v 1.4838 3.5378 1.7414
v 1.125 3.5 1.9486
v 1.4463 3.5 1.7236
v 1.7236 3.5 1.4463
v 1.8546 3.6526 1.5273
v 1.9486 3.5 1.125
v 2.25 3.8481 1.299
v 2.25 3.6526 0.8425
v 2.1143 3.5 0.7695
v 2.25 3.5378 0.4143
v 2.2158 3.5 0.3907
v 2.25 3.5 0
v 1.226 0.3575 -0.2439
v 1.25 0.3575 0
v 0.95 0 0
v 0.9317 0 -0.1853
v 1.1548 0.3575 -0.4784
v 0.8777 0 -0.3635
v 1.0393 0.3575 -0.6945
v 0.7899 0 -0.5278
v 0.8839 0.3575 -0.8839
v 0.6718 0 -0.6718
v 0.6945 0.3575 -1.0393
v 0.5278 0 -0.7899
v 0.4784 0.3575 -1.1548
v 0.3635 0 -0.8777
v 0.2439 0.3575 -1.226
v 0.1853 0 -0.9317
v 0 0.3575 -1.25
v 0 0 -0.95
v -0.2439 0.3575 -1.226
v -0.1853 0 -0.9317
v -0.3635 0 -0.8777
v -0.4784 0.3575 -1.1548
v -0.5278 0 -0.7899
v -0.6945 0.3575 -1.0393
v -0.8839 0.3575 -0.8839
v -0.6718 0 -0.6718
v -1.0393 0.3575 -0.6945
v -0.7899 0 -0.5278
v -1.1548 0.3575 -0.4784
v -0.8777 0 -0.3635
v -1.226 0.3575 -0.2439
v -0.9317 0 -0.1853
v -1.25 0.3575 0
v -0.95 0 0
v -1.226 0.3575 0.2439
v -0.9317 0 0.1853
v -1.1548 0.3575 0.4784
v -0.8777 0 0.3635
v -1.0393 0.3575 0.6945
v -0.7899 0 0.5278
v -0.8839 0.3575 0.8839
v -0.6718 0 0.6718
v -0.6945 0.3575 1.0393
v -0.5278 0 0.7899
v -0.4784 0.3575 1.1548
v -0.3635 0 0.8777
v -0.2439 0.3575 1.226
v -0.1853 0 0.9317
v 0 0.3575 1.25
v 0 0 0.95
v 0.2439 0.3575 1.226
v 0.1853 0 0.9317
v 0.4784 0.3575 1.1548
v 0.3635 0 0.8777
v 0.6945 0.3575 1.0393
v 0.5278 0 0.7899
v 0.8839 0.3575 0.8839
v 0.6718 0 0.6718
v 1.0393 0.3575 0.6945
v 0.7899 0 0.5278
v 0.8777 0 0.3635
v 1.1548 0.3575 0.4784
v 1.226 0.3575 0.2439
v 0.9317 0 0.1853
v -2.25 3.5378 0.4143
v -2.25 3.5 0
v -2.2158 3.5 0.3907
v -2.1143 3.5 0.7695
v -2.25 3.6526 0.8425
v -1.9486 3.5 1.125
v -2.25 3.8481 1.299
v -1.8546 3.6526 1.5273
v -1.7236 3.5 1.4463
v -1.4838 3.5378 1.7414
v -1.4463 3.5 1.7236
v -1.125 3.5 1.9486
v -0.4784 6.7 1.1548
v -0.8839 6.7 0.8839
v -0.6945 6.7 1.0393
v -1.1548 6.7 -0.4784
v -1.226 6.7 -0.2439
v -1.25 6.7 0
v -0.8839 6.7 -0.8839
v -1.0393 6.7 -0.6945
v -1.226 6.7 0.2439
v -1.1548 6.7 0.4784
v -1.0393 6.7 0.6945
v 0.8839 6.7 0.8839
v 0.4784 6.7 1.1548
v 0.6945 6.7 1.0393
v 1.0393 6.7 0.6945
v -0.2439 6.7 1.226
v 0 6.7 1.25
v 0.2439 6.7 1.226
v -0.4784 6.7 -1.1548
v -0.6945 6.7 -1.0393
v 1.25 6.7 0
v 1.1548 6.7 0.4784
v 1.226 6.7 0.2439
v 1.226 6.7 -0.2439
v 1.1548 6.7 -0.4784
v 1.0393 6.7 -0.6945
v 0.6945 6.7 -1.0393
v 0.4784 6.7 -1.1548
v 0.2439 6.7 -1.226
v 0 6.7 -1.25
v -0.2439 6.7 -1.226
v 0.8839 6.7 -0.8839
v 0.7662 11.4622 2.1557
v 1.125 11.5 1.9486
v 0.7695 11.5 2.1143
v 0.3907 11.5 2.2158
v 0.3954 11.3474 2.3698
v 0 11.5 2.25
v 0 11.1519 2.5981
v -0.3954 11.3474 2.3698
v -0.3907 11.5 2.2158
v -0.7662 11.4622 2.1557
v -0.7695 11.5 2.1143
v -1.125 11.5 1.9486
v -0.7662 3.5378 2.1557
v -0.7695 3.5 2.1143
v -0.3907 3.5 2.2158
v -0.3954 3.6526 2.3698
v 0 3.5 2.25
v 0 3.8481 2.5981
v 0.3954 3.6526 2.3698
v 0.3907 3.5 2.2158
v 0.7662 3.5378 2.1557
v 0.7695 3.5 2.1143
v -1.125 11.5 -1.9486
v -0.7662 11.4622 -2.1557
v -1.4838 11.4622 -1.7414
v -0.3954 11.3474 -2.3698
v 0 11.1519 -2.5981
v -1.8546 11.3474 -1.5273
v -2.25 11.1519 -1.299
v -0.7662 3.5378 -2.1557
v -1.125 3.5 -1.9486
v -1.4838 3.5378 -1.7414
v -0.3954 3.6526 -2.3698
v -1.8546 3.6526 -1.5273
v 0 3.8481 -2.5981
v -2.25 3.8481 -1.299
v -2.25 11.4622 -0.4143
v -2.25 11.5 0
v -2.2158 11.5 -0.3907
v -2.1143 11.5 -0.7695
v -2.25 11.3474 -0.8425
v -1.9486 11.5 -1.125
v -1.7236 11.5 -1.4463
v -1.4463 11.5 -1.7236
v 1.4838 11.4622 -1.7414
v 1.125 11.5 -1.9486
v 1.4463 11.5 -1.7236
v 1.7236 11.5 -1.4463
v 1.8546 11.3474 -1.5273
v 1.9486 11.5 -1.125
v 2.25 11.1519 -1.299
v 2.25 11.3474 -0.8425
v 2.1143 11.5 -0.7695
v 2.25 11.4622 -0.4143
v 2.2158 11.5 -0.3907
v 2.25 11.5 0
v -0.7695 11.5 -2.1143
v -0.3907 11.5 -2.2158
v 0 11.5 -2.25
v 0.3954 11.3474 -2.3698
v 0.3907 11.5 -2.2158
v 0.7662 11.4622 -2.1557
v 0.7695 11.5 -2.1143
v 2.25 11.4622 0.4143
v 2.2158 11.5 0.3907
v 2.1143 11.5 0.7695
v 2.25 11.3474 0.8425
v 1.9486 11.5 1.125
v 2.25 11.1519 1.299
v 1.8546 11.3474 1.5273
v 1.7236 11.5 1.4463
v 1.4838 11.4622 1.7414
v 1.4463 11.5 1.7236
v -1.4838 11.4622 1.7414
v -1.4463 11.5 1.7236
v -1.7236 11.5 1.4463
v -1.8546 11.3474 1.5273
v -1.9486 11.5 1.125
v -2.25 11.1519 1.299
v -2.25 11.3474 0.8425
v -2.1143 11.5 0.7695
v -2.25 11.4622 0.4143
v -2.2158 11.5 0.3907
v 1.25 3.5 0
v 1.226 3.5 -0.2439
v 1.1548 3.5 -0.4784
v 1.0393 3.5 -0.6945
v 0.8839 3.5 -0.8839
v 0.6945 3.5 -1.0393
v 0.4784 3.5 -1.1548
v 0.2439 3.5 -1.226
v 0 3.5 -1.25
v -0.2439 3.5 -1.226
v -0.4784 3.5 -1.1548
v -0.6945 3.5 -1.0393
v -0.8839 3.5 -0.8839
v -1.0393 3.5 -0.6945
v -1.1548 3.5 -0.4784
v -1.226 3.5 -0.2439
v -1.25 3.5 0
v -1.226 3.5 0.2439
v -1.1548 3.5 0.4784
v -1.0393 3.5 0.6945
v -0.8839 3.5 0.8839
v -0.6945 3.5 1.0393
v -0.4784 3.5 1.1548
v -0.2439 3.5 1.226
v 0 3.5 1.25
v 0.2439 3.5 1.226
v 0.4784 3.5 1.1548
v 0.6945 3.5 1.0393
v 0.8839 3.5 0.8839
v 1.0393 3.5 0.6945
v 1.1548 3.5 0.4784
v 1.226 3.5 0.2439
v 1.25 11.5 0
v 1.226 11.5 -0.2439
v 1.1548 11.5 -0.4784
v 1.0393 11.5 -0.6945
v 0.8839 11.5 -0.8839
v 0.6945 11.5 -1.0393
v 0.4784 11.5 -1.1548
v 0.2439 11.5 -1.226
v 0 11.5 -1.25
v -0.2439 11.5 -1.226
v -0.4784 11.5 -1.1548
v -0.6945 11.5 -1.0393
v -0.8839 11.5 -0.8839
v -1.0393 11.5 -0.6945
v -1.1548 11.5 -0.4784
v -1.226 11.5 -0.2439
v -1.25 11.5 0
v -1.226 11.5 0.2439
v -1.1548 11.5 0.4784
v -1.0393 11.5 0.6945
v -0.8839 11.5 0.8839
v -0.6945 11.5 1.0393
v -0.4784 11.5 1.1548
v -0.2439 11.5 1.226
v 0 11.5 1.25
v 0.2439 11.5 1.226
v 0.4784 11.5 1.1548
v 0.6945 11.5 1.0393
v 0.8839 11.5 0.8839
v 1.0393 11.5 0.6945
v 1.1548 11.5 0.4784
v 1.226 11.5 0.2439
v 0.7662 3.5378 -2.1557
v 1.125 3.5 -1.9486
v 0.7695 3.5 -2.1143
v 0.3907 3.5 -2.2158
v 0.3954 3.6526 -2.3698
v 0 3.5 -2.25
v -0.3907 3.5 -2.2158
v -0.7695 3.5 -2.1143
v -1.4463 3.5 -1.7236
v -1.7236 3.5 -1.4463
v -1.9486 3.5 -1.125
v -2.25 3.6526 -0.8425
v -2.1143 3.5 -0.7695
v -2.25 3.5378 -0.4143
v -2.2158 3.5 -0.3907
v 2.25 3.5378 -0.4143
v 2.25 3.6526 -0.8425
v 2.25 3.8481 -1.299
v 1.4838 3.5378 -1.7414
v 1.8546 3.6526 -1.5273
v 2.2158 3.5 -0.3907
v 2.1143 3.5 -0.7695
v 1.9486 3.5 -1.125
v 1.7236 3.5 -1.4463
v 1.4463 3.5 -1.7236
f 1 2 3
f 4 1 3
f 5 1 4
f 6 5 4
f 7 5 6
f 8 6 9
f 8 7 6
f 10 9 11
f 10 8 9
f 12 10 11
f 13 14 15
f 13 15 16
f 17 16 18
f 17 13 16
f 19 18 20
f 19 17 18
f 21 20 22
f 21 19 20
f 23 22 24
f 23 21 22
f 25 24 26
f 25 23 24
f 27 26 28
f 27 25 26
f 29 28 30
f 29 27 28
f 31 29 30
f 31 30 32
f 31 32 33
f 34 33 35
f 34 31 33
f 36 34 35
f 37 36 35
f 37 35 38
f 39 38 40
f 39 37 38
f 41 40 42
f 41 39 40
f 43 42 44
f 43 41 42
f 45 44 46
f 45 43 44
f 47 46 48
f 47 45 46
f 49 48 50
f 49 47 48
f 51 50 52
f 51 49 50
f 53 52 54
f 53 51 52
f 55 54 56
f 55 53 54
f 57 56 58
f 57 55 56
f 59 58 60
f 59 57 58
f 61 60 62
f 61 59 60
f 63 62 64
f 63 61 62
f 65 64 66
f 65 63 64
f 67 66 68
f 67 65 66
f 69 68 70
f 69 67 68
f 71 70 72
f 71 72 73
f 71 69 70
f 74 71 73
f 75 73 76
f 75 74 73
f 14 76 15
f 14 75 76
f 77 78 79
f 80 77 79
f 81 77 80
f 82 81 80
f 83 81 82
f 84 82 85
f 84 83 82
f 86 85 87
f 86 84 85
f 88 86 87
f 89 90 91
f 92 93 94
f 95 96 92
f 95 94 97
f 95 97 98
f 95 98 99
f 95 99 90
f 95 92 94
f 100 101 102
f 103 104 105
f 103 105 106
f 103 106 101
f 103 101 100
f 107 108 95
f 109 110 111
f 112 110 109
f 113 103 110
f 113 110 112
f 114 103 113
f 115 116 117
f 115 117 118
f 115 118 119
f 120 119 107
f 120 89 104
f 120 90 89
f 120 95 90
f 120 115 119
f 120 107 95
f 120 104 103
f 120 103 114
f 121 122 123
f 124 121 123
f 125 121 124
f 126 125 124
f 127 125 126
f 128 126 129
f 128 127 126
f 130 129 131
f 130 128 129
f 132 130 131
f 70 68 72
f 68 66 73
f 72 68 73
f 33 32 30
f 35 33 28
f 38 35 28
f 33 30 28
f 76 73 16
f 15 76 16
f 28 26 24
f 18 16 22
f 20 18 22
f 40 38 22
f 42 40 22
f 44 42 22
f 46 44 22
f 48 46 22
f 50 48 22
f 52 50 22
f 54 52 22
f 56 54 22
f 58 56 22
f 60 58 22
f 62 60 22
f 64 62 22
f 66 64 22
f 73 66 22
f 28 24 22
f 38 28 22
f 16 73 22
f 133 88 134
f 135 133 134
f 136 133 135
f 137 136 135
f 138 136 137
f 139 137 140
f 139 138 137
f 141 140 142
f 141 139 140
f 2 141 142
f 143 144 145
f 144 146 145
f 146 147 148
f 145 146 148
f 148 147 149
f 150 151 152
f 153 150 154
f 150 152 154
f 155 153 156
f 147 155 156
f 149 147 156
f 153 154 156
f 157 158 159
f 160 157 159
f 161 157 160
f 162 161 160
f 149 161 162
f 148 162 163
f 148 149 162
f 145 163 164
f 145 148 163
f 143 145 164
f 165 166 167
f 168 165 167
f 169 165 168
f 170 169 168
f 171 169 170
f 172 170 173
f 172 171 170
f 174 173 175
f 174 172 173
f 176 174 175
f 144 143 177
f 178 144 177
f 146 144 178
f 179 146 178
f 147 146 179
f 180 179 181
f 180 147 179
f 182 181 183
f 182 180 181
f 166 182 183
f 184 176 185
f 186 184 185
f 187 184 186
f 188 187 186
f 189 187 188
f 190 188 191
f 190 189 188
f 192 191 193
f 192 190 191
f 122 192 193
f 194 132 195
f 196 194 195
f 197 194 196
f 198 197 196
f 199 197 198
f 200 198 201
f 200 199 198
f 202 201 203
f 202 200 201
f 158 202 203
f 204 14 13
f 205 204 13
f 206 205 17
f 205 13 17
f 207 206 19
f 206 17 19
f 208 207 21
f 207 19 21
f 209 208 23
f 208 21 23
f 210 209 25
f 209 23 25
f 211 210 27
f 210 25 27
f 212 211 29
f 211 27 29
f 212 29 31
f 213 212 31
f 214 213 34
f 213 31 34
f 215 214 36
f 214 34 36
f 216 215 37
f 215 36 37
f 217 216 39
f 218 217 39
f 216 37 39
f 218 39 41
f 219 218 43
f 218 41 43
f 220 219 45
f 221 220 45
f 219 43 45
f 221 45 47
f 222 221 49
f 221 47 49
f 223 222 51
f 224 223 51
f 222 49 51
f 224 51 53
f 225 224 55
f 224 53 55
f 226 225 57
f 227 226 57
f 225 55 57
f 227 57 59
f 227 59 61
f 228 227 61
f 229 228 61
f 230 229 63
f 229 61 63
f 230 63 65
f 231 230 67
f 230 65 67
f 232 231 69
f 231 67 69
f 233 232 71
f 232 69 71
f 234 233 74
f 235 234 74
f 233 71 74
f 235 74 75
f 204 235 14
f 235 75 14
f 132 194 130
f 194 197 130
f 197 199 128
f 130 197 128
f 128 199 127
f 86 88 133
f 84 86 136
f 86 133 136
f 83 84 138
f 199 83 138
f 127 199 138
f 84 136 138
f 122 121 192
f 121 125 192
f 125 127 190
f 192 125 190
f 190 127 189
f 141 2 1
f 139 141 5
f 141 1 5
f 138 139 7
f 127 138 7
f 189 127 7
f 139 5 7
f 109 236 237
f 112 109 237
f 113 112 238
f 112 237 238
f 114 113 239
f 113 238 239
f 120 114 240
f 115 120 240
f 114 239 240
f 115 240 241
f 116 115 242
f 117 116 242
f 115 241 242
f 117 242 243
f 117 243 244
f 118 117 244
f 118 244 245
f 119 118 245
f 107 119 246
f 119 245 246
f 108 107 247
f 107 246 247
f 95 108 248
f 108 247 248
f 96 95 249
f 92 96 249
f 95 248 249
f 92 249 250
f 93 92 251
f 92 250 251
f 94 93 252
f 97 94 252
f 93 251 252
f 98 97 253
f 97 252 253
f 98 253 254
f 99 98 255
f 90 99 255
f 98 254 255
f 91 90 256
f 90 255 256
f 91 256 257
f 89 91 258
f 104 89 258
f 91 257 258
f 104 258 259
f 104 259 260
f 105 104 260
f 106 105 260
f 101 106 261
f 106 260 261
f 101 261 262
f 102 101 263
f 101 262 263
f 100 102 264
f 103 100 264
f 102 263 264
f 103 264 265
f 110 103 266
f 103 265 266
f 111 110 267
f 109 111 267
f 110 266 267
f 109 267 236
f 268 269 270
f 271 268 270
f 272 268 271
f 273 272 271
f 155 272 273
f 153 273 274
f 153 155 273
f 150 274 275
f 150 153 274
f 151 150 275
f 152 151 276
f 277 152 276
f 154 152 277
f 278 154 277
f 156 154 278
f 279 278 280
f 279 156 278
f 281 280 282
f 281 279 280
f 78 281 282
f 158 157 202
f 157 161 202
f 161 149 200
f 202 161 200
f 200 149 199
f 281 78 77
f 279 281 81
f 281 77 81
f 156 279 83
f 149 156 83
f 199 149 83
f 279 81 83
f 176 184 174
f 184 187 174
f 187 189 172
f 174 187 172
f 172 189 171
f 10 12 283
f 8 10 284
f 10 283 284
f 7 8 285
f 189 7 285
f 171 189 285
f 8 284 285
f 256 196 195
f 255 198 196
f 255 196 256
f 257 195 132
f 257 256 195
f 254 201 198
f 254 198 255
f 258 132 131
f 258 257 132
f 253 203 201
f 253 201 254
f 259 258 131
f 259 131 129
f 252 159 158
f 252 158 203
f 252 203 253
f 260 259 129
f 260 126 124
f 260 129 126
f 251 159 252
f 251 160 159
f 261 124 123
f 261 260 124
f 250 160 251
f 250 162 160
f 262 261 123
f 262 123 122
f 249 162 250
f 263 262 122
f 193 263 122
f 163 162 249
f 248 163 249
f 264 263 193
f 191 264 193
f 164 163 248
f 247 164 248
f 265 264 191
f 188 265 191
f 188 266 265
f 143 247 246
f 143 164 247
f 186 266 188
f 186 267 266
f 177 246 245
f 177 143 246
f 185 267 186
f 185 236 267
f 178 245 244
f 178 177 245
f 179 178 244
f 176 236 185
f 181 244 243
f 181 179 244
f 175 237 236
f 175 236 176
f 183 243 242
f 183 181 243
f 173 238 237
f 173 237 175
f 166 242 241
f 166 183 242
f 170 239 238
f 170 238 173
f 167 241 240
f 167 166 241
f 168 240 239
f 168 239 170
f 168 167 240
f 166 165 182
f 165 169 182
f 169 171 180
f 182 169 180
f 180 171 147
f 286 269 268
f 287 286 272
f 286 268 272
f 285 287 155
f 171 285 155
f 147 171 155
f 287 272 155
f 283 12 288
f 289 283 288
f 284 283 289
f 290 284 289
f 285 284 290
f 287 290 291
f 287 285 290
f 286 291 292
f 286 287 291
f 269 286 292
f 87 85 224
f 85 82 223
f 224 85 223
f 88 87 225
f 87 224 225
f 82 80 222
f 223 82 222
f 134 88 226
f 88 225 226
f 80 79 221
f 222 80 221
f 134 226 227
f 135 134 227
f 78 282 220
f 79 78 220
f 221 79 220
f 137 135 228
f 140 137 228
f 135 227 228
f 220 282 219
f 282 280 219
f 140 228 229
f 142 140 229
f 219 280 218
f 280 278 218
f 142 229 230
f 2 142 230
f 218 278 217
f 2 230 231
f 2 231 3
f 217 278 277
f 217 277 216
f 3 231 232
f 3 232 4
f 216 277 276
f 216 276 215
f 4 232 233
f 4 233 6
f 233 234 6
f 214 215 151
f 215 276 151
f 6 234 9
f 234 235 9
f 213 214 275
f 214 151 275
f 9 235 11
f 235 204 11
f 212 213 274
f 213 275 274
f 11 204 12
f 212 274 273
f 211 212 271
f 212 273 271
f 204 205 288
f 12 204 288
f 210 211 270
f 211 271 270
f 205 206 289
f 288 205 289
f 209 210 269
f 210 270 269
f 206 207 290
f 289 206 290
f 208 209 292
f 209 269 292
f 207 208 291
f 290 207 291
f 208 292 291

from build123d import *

# Parameters (mm, degrees)
SKETCH1_R           = 1.25
BOSS_EXTRUDE1_DEPTH = 3.5
BOSS_EXTRUDE2_DEPTH = 8
SKETCH3_R           = 1.25
CUT_EXTRUDE1_DEPTH  = 4.8
SKETCH5_OUTSIDE_W   = 34.18
SKETCH5_OUTSIDE_H   = 34.876
SKETCH5_OUTSIDE_R   = 2.25
CUT_EXTRUDE2_DEPTH  = 12.5
CUT_EXTRUDE2_TAPER  = 45
SKETCH6_OUTSIDE_W   = 27.18
SKETCH6_OUTSIDE_H   = 27.876
SKETCH6_OUTSIDE_R   = 2.25
CUT_EXTRUDE3_DEPTH  = 9
CUT_EXTRUDE3_TAPER  = 45
CHAMFER1_SIZE       = 0.3
CHAMFER1_SIZE2      = 0.357526078


with BuildPart() as part:
    # Sketch1 → Boss-Extrude1 (new body)
    with BuildSketch(Plane(origin=(0, 0, 0), x_dir=(1, 0, 0), z_dir=(0, 1, 0))):
        Circle(SKETCH1_R)
    extrude(amount=BOSS_EXTRUDE1_DEPTH)

    # Sketch2 → Boss-Extrude2 (add)
    with BuildSketch(Plane(origin=(0, 3.5, 0), x_dir=(1, 0, 0), z_dir=(0, 1, 0))):
        Polygon((2.25, -1.299038106), (2.25, 1.299038106), (0, 2.598076211), (-2.25, 1.299038106), (-2.25, -1.299038106), (0, -2.598076211), align=None)
    extrude(amount=BOSS_EXTRUDE2_DEPTH)

    # Sketch3 → Cut-Extrude1 (cut)
    with BuildSketch(Plane(origin=(0, 11.5, 0), x_dir=(1, 0, 0), z_dir=(0, 1, 0))):
        Circle(SKETCH3_R)
    extrude(amount=-CUT_EXTRUDE1_DEPTH, mode=Mode.SUBTRACT)

    # Sketch5 outside → Cut-Extrude2 (cut, through all)
    with BuildSketch(Plane(origin=(0, 11.5, 0), x_dir=(1, 0, 0), z_dir=(0, 1, 0))):
        Rectangle(SKETCH5_OUTSIDE_W, SKETCH5_OUTSIDE_H)
        Circle(SKETCH5_OUTSIDE_R, mode=Mode.SUBTRACT)
    extrude(amount=-CUT_EXTRUDE2_DEPTH, taper=CUT_EXTRUDE2_TAPER, mode=Mode.SUBTRACT)

    # Sketch6 outside → Cut-Extrude3 (cut, through all)
    with BuildSketch(Plane.XZ.offset(-3.5)):
        Rectangle(SKETCH6_OUTSIDE_W, SKETCH6_OUTSIDE_H)
        Circle(SKETCH6_OUTSIDE_R, mode=Mode.SUBTRACT)
    extrude(amount=-CUT_EXTRUDE3_DEPTH, taper=CUT_EXTRUDE3_TAPER, mode=Mode.SUBTRACT)

    # Chamfer1
    chamfer1_edges = [part.edges().sort_by_distance(p)[0] for p in [
        (-1.25, 0, 0),
    ]]
    chamfer1_side = [part.faces().sort_by_distance(p)[0] for p in [
        (0, 0, 0),
    ]]
    chamfer(chamfer1_edges, length=CHAMFER1_SIZE, length2=CHAMFER1_SIZE2, reference=chamfer1_side[0])


solid = part.part
